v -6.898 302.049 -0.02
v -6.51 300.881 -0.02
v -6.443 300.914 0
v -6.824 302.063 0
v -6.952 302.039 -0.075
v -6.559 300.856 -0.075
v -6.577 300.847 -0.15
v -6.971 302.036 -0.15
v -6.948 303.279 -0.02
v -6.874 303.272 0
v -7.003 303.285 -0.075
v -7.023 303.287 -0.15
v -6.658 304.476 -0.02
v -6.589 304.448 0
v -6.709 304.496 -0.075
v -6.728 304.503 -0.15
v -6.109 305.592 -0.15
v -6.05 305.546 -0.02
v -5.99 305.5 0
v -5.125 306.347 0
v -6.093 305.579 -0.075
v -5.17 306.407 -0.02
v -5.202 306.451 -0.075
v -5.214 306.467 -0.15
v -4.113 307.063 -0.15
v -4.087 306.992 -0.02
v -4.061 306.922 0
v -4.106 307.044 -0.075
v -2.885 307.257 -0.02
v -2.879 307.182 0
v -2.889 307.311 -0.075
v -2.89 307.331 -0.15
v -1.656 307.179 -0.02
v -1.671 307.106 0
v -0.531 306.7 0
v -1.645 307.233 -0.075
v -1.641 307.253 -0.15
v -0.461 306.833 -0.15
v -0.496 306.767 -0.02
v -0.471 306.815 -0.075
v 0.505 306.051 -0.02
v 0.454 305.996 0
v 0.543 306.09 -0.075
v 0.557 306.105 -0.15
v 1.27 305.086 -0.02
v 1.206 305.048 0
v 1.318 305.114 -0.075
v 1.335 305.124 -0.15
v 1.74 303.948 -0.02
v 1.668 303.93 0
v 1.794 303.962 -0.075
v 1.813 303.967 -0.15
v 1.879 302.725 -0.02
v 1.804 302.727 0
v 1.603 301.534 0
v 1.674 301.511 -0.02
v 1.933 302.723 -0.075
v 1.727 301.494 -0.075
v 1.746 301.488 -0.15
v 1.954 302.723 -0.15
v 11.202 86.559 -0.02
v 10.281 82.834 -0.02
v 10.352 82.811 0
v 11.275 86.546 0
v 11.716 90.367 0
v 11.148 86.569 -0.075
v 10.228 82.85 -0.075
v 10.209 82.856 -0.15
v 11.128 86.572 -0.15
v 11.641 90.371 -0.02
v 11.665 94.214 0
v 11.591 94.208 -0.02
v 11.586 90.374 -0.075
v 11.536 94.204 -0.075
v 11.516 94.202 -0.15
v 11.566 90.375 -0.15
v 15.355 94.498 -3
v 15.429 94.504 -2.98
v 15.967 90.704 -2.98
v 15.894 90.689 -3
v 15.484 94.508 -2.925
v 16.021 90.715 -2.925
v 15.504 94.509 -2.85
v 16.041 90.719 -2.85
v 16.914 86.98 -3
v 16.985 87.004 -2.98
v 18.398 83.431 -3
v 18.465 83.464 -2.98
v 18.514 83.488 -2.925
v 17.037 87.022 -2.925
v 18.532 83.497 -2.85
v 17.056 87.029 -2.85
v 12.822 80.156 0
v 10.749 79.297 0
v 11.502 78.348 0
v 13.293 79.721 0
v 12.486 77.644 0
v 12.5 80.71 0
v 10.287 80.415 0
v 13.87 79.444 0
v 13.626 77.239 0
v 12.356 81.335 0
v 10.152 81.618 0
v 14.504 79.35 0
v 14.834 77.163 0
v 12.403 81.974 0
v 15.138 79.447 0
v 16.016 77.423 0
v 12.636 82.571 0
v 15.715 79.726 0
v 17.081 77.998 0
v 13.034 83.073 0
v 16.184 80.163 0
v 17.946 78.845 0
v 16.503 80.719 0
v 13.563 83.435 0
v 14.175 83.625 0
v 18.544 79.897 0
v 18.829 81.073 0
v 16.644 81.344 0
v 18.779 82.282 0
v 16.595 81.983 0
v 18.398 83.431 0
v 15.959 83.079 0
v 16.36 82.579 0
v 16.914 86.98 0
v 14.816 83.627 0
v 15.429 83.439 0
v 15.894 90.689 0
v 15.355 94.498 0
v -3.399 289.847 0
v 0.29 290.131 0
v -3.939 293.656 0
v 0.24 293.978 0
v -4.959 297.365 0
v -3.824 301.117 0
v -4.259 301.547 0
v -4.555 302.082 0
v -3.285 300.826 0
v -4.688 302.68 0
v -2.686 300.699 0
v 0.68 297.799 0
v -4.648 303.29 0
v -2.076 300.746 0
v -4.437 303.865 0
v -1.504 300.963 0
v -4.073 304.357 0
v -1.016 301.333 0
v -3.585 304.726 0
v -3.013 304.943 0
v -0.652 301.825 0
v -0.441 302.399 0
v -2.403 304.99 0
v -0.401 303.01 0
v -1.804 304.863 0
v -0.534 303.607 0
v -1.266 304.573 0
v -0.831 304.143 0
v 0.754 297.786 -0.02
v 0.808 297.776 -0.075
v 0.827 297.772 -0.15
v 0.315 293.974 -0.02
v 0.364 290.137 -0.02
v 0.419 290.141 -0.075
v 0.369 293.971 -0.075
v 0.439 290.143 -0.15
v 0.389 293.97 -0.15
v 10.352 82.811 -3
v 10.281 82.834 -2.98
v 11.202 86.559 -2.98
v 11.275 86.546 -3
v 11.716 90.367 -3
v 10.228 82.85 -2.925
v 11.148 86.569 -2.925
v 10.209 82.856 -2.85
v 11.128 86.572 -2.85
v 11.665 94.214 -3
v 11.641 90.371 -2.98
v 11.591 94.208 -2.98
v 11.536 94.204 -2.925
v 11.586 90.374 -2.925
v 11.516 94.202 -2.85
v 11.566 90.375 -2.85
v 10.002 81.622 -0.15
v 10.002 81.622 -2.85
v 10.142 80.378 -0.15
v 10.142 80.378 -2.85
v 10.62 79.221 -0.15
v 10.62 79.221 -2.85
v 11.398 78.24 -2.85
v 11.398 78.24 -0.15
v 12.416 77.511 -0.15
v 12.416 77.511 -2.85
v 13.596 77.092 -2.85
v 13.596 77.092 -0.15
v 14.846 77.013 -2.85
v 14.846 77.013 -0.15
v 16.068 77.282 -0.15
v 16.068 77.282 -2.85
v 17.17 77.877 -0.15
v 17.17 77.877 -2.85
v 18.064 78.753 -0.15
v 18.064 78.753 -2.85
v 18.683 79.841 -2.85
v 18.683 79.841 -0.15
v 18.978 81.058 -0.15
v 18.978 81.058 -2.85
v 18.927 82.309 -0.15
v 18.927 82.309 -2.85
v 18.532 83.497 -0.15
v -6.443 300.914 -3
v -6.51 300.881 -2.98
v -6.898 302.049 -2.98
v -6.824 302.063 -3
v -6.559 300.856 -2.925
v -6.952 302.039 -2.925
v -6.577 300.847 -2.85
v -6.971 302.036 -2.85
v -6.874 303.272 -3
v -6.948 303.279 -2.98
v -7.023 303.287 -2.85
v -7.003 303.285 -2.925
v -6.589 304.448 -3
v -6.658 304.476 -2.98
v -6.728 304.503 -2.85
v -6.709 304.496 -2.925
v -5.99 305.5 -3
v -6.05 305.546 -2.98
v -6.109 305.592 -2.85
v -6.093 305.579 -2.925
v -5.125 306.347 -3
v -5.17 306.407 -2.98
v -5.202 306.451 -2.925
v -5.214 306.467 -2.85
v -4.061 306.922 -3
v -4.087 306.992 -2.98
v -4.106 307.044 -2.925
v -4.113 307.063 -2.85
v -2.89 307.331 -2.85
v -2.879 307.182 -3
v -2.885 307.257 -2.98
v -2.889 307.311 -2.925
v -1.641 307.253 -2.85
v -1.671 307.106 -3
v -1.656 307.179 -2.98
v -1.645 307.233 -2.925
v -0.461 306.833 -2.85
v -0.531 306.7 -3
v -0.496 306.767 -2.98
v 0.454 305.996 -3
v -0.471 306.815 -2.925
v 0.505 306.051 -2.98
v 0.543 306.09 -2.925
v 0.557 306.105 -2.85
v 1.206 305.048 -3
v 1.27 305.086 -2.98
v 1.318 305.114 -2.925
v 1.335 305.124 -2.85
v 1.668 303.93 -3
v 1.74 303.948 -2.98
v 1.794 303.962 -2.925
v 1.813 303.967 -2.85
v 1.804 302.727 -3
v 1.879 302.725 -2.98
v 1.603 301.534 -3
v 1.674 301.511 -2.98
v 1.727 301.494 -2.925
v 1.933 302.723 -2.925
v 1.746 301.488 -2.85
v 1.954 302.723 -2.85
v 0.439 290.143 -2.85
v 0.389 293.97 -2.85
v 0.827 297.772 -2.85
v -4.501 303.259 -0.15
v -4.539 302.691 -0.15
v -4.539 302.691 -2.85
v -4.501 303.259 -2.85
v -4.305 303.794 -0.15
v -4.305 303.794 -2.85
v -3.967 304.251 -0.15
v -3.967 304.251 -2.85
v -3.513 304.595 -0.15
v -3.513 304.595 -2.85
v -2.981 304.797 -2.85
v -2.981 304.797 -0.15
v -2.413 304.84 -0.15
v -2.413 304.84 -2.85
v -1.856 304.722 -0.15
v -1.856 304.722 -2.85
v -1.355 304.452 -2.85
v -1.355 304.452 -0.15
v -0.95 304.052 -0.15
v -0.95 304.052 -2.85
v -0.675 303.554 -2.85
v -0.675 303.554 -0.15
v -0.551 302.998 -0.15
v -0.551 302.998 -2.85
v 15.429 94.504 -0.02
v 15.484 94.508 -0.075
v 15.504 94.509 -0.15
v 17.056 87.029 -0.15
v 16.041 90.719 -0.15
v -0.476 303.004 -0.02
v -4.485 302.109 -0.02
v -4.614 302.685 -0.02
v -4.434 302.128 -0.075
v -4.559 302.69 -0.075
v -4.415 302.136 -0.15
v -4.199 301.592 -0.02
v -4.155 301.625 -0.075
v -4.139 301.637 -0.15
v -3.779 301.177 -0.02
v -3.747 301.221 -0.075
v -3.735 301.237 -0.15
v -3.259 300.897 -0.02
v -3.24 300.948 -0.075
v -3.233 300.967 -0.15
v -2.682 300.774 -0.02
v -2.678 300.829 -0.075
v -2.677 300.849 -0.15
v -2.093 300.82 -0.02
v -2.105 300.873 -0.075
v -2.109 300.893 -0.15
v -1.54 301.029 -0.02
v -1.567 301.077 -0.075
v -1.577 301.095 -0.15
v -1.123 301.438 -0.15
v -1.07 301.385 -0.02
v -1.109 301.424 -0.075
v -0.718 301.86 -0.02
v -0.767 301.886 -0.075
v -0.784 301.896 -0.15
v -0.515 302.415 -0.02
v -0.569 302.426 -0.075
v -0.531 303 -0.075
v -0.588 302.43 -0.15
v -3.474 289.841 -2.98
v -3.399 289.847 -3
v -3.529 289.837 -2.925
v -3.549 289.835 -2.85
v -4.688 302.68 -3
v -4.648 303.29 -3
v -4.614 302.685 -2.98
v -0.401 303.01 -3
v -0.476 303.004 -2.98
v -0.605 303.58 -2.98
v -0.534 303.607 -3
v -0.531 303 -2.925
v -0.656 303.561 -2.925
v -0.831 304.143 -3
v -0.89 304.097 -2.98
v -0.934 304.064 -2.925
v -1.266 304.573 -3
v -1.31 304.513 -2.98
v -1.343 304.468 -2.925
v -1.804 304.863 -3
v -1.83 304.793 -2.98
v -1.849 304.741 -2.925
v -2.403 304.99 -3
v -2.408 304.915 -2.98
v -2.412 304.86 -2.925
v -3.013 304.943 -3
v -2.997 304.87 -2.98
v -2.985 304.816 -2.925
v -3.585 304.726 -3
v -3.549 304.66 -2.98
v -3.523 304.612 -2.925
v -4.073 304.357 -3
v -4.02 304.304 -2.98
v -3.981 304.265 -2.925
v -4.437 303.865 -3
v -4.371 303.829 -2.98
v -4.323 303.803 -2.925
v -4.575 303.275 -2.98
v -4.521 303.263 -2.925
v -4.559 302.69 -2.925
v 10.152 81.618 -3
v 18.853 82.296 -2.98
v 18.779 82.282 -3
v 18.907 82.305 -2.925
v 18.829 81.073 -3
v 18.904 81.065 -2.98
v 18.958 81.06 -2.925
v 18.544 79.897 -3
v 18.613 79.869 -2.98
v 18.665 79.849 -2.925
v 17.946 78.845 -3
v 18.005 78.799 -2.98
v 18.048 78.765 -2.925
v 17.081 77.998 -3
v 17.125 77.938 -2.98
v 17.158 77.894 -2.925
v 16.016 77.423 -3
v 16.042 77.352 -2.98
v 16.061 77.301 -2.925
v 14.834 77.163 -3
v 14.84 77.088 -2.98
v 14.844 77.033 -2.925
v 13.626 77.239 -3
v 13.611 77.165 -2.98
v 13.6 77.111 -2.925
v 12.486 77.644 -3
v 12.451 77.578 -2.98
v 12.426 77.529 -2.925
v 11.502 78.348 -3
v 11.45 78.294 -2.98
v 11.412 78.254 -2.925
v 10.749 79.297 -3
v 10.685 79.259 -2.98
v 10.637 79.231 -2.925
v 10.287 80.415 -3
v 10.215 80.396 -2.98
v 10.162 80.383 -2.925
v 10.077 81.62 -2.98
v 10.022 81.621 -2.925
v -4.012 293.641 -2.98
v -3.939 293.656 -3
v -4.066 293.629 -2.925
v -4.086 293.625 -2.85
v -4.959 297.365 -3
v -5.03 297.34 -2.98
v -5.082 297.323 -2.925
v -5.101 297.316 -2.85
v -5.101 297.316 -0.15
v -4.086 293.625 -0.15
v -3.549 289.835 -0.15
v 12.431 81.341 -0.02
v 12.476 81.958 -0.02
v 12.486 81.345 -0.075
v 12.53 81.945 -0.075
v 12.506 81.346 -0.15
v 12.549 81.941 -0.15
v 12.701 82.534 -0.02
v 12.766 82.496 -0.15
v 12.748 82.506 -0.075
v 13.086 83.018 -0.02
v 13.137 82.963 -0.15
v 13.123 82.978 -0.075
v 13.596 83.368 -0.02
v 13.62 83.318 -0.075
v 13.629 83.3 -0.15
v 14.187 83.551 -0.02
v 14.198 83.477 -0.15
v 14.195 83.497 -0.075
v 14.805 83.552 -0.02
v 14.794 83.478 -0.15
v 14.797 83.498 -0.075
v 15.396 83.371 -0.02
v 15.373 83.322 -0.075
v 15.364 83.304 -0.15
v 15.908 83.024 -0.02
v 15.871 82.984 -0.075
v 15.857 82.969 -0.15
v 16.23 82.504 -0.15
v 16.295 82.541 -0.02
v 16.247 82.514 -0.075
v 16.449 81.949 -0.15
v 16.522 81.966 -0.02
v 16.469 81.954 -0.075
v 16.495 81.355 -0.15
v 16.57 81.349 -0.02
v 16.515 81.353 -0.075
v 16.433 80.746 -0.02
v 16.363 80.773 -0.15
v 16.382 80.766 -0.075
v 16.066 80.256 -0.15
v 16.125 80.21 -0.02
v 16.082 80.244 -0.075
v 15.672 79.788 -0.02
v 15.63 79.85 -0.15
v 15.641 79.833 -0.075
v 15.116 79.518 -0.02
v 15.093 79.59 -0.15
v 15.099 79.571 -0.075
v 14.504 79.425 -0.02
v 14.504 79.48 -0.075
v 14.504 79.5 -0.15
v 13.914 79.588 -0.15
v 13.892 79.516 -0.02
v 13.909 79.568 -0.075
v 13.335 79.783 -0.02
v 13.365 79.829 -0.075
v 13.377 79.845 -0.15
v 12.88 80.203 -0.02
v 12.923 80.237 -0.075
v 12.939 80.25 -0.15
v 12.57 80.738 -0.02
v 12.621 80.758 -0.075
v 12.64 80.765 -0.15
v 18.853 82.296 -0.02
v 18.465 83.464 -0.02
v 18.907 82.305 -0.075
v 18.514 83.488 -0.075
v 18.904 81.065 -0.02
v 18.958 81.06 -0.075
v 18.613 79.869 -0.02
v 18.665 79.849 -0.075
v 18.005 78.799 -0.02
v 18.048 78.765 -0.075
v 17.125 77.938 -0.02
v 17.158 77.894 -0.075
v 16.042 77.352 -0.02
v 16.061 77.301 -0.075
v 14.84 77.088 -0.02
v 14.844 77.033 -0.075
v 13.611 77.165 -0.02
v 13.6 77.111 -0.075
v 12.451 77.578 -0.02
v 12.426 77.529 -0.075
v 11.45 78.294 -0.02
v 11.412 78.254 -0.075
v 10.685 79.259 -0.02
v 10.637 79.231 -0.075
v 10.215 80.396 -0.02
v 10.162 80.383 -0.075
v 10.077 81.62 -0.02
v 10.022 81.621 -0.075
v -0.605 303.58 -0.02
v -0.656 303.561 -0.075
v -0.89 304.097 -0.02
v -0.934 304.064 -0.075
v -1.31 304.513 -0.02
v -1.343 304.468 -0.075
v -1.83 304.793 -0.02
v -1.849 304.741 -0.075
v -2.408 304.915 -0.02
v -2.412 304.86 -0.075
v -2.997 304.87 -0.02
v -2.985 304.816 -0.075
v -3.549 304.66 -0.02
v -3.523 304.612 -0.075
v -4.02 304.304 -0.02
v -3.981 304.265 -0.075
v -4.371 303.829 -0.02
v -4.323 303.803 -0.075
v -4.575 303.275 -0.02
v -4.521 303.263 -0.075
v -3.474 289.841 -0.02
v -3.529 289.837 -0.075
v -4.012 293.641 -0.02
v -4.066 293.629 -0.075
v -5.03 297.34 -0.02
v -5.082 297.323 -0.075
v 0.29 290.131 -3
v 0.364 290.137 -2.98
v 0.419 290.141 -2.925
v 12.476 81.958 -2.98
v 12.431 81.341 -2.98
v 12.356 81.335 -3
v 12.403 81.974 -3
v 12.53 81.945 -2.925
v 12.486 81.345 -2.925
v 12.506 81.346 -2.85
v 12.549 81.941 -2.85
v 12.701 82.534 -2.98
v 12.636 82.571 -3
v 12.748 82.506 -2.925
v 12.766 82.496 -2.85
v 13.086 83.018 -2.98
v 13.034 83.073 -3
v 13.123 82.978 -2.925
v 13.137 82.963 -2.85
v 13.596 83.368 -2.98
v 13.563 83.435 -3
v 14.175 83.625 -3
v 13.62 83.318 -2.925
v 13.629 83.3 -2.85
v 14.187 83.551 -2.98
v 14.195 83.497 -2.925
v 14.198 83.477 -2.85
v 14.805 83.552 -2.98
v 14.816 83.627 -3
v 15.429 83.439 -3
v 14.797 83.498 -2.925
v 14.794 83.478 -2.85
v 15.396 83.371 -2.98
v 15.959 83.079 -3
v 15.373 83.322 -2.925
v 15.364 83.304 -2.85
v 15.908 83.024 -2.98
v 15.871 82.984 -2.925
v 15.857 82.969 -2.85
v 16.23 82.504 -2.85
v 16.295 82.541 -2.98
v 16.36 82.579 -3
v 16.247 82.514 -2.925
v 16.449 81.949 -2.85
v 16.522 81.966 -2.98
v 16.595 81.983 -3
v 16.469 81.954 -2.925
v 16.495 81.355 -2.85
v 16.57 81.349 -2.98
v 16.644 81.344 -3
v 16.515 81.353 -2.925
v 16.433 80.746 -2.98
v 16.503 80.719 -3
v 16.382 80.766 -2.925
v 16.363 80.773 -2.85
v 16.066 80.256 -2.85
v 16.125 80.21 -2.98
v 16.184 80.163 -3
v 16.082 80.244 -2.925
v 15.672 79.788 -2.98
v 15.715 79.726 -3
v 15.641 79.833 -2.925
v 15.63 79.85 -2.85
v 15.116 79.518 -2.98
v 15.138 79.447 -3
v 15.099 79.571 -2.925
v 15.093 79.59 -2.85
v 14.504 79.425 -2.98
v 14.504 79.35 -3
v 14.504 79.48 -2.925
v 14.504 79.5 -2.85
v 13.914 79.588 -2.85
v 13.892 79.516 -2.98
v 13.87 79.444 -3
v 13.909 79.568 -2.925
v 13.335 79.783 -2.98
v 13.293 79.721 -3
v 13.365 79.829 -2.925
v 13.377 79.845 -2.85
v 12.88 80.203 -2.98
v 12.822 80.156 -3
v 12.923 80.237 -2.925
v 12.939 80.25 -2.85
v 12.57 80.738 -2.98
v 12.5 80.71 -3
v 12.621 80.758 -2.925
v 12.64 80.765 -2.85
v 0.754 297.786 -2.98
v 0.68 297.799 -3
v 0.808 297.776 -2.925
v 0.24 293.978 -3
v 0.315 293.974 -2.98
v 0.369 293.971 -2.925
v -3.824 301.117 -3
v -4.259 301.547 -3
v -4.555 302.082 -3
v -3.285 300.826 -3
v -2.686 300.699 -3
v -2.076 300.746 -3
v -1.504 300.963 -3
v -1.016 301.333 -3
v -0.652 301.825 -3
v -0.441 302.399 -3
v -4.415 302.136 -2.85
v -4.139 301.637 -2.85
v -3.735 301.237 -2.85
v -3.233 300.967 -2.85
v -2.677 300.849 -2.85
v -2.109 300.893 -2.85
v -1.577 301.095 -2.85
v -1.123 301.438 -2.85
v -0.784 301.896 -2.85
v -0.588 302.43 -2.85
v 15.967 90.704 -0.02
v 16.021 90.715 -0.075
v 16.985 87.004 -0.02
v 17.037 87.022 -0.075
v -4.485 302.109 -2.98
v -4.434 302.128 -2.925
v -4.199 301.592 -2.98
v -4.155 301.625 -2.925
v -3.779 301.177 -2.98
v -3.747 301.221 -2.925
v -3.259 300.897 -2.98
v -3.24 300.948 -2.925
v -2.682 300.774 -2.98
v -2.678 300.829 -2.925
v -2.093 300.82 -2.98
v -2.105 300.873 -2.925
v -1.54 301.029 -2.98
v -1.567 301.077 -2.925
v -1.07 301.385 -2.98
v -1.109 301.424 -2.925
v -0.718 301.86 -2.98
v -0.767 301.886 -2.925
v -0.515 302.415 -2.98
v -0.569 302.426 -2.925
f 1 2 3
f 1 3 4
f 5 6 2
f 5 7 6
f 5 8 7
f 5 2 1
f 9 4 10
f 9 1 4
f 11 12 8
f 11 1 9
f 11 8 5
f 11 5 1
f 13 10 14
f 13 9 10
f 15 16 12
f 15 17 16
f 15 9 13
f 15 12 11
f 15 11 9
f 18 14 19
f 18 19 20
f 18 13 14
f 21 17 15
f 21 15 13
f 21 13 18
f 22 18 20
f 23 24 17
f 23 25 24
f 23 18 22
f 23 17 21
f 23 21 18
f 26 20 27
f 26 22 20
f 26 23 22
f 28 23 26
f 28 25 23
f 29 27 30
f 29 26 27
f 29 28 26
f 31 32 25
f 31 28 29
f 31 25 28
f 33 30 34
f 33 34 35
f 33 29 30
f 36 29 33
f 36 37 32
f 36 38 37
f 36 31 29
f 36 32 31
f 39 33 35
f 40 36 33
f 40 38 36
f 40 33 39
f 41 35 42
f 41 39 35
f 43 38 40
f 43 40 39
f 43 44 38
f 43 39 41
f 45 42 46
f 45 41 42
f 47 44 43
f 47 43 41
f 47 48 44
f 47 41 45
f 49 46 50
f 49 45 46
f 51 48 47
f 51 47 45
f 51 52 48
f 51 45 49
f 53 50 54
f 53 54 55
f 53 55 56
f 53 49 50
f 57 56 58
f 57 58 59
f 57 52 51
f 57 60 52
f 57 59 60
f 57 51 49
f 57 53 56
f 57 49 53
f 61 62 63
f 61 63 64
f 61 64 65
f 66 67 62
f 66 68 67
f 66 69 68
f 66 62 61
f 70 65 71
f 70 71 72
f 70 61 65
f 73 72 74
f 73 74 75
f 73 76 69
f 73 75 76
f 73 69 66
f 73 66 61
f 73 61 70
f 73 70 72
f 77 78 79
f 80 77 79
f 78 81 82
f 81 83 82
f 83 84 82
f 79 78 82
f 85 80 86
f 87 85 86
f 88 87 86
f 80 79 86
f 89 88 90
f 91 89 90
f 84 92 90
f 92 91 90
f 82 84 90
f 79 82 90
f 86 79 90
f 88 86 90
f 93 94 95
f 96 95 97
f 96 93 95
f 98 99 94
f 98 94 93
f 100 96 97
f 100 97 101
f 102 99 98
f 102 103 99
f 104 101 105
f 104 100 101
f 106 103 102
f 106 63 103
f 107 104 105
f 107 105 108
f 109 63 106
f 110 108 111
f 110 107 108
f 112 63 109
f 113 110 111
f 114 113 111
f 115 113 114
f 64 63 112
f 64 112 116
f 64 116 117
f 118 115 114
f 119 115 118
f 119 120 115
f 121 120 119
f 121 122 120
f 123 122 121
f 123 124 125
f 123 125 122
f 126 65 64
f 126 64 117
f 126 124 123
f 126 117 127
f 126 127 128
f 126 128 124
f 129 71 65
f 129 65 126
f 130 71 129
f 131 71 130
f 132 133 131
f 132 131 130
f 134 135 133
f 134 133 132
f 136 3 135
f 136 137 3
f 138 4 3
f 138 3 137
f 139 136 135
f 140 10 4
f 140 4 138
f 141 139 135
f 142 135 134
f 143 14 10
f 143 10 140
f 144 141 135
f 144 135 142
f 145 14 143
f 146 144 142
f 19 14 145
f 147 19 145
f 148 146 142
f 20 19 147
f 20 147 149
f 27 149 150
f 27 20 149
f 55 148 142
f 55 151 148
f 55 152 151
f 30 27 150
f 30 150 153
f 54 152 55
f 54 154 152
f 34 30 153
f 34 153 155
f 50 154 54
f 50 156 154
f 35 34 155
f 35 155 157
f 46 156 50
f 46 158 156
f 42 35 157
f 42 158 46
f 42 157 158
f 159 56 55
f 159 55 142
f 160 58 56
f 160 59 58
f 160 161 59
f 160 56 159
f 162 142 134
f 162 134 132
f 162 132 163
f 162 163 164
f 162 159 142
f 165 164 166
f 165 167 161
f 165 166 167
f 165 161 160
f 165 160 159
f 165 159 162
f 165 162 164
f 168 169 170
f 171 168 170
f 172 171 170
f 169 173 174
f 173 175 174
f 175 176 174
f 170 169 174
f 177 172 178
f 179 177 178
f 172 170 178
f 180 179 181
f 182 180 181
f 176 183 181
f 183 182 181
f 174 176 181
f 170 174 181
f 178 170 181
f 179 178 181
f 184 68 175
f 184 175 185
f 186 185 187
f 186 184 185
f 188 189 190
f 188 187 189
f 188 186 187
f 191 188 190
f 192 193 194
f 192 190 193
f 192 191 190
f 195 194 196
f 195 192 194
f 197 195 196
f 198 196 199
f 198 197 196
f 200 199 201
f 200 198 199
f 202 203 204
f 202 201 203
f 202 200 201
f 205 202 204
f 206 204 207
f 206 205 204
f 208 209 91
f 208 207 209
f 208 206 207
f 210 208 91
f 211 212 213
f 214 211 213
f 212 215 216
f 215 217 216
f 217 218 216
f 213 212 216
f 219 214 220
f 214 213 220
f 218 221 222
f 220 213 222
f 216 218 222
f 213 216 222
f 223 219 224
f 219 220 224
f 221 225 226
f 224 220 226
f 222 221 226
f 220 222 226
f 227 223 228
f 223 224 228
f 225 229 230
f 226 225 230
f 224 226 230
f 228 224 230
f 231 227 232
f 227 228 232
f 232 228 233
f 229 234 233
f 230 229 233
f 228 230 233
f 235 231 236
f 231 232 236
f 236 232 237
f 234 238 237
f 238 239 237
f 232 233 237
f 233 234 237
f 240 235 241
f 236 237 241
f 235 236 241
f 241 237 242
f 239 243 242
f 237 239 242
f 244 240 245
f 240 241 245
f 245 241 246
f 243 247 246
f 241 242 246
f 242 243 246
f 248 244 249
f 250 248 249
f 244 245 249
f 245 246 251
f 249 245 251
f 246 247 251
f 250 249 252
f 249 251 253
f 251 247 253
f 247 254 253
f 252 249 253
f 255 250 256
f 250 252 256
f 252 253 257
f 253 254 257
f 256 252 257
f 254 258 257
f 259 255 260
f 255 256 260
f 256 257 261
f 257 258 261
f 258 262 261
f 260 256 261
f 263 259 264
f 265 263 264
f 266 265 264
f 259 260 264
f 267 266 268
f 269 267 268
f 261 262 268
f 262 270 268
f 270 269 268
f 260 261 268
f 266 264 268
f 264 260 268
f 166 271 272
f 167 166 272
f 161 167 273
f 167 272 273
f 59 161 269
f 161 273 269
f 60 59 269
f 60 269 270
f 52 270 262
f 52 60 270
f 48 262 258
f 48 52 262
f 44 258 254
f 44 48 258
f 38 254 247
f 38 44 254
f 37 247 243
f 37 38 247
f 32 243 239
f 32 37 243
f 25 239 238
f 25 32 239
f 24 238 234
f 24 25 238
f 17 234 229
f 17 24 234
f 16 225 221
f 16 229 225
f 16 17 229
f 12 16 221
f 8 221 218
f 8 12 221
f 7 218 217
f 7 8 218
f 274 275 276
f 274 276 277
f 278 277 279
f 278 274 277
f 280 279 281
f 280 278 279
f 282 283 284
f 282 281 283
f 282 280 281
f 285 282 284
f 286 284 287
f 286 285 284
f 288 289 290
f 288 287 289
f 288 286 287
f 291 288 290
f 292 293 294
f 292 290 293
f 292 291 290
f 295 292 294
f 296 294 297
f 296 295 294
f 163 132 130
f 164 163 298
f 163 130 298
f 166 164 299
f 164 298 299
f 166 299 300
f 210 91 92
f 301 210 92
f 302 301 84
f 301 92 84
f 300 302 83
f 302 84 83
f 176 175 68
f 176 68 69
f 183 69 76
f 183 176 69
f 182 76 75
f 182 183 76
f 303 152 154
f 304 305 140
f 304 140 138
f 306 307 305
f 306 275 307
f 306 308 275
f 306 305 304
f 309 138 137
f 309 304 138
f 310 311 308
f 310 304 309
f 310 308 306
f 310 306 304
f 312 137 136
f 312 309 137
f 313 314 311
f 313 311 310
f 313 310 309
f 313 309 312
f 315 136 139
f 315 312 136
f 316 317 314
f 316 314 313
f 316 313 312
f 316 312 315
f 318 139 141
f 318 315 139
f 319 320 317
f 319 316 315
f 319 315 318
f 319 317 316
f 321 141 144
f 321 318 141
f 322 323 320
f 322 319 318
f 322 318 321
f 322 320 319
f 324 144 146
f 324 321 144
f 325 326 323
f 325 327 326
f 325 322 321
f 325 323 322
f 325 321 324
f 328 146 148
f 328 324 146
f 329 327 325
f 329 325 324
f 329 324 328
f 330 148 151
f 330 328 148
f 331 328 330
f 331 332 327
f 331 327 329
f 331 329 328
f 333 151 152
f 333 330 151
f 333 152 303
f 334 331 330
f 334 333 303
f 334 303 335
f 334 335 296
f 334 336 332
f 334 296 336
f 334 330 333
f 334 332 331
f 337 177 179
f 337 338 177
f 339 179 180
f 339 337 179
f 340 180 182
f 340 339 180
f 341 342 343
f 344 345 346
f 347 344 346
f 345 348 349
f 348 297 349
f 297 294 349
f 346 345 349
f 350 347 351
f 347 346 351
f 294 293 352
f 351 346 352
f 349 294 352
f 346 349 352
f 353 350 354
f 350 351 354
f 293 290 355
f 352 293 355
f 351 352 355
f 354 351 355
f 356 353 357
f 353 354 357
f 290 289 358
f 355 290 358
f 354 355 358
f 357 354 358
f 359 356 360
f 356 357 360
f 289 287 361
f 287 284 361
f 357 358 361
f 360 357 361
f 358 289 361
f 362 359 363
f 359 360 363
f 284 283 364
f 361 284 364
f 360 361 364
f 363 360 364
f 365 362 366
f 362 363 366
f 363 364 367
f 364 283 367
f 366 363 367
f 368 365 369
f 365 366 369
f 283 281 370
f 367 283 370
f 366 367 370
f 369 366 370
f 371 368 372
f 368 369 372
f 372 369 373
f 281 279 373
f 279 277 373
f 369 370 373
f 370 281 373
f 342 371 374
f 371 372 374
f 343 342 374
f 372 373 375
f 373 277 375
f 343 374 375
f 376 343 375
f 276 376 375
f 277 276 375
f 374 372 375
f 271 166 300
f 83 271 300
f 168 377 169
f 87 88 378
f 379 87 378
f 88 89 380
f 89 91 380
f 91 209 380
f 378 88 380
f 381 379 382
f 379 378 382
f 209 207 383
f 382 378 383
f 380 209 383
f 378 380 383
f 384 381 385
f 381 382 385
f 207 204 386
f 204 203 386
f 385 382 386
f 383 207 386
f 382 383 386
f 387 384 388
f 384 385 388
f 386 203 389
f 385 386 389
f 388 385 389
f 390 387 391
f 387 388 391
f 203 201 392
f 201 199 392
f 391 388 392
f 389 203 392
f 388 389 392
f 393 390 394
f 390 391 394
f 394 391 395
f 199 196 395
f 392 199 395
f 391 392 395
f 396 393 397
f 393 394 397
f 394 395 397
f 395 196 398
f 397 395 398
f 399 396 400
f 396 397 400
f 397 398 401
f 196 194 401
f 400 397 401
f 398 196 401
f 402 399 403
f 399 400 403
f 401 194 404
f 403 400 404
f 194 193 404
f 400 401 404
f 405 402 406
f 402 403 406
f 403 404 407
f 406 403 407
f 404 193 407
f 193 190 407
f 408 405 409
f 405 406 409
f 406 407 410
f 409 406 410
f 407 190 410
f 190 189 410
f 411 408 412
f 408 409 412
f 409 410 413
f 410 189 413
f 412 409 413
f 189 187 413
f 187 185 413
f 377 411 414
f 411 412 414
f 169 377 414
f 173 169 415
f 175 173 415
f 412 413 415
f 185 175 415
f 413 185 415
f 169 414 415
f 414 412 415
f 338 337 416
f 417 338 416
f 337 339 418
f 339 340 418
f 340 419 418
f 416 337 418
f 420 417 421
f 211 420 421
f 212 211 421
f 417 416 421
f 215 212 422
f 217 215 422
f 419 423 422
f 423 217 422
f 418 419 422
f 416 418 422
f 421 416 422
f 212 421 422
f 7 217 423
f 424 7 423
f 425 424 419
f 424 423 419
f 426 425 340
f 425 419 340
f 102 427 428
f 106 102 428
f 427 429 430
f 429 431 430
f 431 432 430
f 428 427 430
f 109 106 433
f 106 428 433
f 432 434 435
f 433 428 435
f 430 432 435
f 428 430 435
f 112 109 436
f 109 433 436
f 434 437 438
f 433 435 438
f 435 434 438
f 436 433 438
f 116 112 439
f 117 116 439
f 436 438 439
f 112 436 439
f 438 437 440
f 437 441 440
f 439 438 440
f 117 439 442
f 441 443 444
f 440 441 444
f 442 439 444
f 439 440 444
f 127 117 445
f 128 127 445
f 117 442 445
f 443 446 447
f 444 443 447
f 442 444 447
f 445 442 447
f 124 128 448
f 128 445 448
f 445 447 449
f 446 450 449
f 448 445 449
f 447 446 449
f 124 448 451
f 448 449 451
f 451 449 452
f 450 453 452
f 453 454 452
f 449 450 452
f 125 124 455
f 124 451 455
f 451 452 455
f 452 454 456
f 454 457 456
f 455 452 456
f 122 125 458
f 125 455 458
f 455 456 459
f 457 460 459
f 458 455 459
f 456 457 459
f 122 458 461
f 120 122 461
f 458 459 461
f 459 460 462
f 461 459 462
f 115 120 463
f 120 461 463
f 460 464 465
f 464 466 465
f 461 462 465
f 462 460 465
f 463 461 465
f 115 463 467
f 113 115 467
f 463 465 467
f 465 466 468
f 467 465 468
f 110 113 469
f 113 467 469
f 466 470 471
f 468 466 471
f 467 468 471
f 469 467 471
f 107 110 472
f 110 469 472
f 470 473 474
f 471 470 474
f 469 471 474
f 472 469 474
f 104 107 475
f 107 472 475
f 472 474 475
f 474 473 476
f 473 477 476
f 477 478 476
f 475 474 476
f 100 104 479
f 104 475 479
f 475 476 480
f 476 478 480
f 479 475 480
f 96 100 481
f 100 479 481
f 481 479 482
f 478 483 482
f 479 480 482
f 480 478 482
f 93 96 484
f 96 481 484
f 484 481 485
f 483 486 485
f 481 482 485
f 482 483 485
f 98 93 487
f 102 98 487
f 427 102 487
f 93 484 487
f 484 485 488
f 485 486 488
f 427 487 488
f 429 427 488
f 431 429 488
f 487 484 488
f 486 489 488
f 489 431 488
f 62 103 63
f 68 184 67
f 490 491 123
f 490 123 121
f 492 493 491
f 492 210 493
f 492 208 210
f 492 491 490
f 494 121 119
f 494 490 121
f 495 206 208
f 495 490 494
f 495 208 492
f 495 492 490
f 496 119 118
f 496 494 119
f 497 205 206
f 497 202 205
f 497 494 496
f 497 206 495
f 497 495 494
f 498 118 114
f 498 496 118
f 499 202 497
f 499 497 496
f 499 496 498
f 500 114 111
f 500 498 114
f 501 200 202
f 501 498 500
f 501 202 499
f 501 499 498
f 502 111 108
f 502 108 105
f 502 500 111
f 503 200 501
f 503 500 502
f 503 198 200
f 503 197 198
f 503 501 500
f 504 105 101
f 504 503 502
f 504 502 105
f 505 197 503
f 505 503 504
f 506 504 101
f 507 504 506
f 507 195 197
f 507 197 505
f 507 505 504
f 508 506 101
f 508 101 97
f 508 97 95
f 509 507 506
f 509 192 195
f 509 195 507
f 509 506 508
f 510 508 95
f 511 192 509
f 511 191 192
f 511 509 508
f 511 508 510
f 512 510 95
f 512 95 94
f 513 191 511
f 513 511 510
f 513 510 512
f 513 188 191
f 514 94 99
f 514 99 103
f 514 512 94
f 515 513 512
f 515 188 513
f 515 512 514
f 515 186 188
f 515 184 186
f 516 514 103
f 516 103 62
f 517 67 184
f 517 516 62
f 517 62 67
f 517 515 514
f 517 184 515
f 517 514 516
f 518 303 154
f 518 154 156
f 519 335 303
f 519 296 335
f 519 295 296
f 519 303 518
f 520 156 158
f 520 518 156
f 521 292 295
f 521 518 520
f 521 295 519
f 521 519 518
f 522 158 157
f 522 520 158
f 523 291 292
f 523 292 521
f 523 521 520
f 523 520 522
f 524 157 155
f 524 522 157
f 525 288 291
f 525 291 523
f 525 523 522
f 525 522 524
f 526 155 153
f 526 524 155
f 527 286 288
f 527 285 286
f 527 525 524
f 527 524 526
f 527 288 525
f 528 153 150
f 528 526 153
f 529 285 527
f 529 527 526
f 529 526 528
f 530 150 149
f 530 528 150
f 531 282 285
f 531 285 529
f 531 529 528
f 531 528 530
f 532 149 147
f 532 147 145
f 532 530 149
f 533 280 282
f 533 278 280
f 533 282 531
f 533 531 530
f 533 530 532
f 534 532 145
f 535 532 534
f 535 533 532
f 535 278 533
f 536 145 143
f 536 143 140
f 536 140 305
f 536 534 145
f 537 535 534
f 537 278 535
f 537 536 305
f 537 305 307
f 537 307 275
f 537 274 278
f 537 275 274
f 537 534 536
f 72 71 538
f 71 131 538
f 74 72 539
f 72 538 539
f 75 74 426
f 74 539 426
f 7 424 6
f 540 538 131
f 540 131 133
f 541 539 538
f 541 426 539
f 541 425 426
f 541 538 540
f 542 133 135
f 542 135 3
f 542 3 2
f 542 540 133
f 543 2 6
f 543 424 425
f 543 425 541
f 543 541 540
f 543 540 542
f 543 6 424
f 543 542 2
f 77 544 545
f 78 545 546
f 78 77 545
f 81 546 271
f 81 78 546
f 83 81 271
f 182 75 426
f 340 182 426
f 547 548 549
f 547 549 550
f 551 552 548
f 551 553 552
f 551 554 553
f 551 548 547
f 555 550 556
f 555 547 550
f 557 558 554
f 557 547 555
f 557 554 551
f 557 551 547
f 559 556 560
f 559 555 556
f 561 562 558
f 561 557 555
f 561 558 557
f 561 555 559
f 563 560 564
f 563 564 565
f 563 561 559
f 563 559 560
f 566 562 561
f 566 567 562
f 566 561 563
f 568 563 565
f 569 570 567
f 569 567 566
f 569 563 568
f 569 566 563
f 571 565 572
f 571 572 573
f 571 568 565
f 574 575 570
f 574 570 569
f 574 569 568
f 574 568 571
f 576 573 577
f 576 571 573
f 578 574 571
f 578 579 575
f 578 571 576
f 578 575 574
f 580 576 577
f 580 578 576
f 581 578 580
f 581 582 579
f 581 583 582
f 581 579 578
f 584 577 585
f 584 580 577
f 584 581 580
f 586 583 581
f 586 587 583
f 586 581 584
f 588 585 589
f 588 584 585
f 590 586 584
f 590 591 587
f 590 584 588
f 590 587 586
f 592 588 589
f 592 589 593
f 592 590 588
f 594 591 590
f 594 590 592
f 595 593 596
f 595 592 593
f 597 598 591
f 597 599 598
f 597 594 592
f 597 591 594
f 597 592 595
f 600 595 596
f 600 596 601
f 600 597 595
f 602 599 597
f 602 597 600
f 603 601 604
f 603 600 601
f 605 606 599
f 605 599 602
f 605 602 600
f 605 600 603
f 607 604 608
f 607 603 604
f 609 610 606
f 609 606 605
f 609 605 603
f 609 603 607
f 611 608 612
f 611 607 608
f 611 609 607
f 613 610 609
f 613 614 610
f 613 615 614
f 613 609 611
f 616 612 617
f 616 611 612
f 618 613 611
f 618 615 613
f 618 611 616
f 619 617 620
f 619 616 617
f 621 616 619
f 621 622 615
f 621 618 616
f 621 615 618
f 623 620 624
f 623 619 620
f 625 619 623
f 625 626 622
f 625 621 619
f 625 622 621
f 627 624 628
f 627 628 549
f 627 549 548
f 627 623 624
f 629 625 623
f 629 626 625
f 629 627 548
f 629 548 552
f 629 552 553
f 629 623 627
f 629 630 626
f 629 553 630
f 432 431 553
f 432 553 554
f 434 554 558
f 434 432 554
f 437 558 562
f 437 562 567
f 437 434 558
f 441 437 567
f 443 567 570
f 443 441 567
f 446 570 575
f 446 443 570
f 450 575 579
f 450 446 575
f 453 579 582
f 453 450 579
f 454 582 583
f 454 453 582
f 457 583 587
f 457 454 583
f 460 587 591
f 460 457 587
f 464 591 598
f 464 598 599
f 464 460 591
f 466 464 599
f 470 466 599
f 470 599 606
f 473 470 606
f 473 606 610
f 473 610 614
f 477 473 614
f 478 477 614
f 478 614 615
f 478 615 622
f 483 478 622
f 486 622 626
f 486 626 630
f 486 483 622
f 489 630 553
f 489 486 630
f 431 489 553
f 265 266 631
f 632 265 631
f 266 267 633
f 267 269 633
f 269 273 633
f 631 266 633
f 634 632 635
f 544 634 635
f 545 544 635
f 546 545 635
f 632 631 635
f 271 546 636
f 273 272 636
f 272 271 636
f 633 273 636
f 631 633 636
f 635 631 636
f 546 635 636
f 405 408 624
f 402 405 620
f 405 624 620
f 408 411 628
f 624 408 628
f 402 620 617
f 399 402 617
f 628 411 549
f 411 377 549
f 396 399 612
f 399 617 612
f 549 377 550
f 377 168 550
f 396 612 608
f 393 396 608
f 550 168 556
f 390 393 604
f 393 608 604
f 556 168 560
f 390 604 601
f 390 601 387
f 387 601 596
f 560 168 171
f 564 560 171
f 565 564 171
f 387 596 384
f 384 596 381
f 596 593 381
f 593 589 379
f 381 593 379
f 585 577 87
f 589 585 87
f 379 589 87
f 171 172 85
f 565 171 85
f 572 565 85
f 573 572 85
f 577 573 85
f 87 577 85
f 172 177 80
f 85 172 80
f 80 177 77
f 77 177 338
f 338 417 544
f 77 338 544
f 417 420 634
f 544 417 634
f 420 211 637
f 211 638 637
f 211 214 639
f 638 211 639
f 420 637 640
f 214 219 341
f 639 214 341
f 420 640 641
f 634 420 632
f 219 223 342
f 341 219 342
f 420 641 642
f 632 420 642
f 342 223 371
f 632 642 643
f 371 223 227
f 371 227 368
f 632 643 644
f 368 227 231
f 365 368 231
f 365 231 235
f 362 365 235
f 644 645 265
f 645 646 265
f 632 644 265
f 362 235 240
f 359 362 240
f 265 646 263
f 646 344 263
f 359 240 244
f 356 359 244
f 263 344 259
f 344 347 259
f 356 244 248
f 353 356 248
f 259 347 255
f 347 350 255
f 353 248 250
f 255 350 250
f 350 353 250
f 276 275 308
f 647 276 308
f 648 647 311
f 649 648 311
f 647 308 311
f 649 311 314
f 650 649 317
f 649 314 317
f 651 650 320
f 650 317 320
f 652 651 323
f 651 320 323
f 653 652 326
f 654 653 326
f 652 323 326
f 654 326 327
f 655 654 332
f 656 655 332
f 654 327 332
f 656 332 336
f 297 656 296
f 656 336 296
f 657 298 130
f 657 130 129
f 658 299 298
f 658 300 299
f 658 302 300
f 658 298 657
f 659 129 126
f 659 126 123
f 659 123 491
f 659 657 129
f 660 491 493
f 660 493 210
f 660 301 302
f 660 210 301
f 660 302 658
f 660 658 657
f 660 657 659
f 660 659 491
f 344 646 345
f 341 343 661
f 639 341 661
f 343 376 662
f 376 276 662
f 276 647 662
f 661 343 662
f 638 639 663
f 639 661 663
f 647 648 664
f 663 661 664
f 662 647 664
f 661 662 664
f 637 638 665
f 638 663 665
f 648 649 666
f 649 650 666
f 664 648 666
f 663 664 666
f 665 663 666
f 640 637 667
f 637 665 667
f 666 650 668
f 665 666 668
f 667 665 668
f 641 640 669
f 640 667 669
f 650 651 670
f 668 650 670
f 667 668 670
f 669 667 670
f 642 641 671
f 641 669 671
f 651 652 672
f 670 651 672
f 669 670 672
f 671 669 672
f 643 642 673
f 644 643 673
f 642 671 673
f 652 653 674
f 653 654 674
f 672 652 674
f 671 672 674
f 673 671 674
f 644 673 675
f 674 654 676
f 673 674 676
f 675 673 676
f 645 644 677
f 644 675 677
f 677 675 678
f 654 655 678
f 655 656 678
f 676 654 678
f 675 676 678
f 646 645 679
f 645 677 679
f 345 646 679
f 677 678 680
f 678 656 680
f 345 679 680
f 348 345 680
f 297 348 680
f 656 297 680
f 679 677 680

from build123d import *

# Parameters (mm, degrees)
BOSS_EXTRUDE1_DEPTH = 3
FILLET1_R           = 30
FILLET2_R           = 0.15


with BuildPart() as part:
    # Sketch1 → Boss-Extrude1 (new body)
    with BuildSketch(Plane.XY):
        with BuildLine():
            ThreePointArc((12.196400326, 85.365673103), (14.845502434, 77.013283153), (16.184593079, 85.672786378))
            Line((16.184593079, 85.672786378), (16.494096377, 81.653556637))
            ThreePointArc((16.494096377, 81.653556637), (14.653556637, 79.505903623), (12.505903623, 81.346443363))
            Line((12.505903623, 81.346443363), (12.196400326, 85.365673103))
        make_face()
        with BuildLine():
            Line((-0.550690361, 302.998254439), (16.494096377, 81.653556637))
            ThreePointArc((16.494096377, 81.653556637), (14.346443363, 83.494096377), (12.505903623, 81.346443363))
            Line((12.505903623, 81.346443363), (-4.538883114, 302.691141165))
            ThreePointArc((-4.538883114, 302.691141165), (-2.3912301, 300.850601425), (-0.550690361, 302.998254439))
        make_face()
        with BuildLine():
            ThreePointArc((-4.538883114, 302.691141165), (-2.698343375, 304.838794179), (-0.550690361, 302.998254439))
            Line((-0.550690361, 302.998254439), (-0.241187064, 298.979024699))
            ThreePointArc((-0.241187064, 298.979024699), (-2.890289172, 307.331414649), (-4.229379817, 298.671911424))
            Line((-4.229379817, 298.671911424), (-4.538883114, 302.691141165))
        make_face()
    extrude(amount=-BOSS_EXTRUDE1_DEPTH)

    # Fillet1
    fillet1_edges = [part.edges().sort_by_distance(p)[0] for p in [
        (16.184593079, 85.672786378, -1.5),
        (12.196400326, 85.365673103, -1.5),
        (-4.229379817, 298.671911424, -1.5),
        (-0.241187064, 298.979024699, -1.5),
    ]]
    fillet(fillet1_edges, radius=FILLET1_R)

    # Fillet2
    fillet2_edges = [part.edges().sort_by_distance(p)[0] for p in [
        (3.983510255, 192.018792264, 0),
        (3.983510255, 192.018792264, -3),
        (14.845502434, 77.013283153, 0),
        (14.845502434, 77.013283153, -3),
        (12.505903623, 81.346443363, -3),
        (7.971703008, 192.325905538, 0),
        (7.971703008, 192.325905538, -3),
        (-2.890289172, 307.331414649, 0),
        (-2.890289172, 307.331414649, -3),
        (11.407501389, 88.466521567, 0),
        (11.407501389, 88.466521567, -3),
        (16.489440699, 88.857859479, 0),
        (16.489440699, 88.857859479, -3),
        (-4.534227437, 295.486838323, 0),
        (-2.3912301, 300.850601425, -3),
        (-4.534227437, 295.486838323, -3),
        (0.547711873, 295.878176235, 0),
        (0.547711873, 295.878176235, -3),
        (-2.3912301, 300.850601425, 0),
        (12.505903623, 81.346443363, 0),
    ]]
    fillet(fillet2_edges, radius=FILLET2_R)


solid = part.part
